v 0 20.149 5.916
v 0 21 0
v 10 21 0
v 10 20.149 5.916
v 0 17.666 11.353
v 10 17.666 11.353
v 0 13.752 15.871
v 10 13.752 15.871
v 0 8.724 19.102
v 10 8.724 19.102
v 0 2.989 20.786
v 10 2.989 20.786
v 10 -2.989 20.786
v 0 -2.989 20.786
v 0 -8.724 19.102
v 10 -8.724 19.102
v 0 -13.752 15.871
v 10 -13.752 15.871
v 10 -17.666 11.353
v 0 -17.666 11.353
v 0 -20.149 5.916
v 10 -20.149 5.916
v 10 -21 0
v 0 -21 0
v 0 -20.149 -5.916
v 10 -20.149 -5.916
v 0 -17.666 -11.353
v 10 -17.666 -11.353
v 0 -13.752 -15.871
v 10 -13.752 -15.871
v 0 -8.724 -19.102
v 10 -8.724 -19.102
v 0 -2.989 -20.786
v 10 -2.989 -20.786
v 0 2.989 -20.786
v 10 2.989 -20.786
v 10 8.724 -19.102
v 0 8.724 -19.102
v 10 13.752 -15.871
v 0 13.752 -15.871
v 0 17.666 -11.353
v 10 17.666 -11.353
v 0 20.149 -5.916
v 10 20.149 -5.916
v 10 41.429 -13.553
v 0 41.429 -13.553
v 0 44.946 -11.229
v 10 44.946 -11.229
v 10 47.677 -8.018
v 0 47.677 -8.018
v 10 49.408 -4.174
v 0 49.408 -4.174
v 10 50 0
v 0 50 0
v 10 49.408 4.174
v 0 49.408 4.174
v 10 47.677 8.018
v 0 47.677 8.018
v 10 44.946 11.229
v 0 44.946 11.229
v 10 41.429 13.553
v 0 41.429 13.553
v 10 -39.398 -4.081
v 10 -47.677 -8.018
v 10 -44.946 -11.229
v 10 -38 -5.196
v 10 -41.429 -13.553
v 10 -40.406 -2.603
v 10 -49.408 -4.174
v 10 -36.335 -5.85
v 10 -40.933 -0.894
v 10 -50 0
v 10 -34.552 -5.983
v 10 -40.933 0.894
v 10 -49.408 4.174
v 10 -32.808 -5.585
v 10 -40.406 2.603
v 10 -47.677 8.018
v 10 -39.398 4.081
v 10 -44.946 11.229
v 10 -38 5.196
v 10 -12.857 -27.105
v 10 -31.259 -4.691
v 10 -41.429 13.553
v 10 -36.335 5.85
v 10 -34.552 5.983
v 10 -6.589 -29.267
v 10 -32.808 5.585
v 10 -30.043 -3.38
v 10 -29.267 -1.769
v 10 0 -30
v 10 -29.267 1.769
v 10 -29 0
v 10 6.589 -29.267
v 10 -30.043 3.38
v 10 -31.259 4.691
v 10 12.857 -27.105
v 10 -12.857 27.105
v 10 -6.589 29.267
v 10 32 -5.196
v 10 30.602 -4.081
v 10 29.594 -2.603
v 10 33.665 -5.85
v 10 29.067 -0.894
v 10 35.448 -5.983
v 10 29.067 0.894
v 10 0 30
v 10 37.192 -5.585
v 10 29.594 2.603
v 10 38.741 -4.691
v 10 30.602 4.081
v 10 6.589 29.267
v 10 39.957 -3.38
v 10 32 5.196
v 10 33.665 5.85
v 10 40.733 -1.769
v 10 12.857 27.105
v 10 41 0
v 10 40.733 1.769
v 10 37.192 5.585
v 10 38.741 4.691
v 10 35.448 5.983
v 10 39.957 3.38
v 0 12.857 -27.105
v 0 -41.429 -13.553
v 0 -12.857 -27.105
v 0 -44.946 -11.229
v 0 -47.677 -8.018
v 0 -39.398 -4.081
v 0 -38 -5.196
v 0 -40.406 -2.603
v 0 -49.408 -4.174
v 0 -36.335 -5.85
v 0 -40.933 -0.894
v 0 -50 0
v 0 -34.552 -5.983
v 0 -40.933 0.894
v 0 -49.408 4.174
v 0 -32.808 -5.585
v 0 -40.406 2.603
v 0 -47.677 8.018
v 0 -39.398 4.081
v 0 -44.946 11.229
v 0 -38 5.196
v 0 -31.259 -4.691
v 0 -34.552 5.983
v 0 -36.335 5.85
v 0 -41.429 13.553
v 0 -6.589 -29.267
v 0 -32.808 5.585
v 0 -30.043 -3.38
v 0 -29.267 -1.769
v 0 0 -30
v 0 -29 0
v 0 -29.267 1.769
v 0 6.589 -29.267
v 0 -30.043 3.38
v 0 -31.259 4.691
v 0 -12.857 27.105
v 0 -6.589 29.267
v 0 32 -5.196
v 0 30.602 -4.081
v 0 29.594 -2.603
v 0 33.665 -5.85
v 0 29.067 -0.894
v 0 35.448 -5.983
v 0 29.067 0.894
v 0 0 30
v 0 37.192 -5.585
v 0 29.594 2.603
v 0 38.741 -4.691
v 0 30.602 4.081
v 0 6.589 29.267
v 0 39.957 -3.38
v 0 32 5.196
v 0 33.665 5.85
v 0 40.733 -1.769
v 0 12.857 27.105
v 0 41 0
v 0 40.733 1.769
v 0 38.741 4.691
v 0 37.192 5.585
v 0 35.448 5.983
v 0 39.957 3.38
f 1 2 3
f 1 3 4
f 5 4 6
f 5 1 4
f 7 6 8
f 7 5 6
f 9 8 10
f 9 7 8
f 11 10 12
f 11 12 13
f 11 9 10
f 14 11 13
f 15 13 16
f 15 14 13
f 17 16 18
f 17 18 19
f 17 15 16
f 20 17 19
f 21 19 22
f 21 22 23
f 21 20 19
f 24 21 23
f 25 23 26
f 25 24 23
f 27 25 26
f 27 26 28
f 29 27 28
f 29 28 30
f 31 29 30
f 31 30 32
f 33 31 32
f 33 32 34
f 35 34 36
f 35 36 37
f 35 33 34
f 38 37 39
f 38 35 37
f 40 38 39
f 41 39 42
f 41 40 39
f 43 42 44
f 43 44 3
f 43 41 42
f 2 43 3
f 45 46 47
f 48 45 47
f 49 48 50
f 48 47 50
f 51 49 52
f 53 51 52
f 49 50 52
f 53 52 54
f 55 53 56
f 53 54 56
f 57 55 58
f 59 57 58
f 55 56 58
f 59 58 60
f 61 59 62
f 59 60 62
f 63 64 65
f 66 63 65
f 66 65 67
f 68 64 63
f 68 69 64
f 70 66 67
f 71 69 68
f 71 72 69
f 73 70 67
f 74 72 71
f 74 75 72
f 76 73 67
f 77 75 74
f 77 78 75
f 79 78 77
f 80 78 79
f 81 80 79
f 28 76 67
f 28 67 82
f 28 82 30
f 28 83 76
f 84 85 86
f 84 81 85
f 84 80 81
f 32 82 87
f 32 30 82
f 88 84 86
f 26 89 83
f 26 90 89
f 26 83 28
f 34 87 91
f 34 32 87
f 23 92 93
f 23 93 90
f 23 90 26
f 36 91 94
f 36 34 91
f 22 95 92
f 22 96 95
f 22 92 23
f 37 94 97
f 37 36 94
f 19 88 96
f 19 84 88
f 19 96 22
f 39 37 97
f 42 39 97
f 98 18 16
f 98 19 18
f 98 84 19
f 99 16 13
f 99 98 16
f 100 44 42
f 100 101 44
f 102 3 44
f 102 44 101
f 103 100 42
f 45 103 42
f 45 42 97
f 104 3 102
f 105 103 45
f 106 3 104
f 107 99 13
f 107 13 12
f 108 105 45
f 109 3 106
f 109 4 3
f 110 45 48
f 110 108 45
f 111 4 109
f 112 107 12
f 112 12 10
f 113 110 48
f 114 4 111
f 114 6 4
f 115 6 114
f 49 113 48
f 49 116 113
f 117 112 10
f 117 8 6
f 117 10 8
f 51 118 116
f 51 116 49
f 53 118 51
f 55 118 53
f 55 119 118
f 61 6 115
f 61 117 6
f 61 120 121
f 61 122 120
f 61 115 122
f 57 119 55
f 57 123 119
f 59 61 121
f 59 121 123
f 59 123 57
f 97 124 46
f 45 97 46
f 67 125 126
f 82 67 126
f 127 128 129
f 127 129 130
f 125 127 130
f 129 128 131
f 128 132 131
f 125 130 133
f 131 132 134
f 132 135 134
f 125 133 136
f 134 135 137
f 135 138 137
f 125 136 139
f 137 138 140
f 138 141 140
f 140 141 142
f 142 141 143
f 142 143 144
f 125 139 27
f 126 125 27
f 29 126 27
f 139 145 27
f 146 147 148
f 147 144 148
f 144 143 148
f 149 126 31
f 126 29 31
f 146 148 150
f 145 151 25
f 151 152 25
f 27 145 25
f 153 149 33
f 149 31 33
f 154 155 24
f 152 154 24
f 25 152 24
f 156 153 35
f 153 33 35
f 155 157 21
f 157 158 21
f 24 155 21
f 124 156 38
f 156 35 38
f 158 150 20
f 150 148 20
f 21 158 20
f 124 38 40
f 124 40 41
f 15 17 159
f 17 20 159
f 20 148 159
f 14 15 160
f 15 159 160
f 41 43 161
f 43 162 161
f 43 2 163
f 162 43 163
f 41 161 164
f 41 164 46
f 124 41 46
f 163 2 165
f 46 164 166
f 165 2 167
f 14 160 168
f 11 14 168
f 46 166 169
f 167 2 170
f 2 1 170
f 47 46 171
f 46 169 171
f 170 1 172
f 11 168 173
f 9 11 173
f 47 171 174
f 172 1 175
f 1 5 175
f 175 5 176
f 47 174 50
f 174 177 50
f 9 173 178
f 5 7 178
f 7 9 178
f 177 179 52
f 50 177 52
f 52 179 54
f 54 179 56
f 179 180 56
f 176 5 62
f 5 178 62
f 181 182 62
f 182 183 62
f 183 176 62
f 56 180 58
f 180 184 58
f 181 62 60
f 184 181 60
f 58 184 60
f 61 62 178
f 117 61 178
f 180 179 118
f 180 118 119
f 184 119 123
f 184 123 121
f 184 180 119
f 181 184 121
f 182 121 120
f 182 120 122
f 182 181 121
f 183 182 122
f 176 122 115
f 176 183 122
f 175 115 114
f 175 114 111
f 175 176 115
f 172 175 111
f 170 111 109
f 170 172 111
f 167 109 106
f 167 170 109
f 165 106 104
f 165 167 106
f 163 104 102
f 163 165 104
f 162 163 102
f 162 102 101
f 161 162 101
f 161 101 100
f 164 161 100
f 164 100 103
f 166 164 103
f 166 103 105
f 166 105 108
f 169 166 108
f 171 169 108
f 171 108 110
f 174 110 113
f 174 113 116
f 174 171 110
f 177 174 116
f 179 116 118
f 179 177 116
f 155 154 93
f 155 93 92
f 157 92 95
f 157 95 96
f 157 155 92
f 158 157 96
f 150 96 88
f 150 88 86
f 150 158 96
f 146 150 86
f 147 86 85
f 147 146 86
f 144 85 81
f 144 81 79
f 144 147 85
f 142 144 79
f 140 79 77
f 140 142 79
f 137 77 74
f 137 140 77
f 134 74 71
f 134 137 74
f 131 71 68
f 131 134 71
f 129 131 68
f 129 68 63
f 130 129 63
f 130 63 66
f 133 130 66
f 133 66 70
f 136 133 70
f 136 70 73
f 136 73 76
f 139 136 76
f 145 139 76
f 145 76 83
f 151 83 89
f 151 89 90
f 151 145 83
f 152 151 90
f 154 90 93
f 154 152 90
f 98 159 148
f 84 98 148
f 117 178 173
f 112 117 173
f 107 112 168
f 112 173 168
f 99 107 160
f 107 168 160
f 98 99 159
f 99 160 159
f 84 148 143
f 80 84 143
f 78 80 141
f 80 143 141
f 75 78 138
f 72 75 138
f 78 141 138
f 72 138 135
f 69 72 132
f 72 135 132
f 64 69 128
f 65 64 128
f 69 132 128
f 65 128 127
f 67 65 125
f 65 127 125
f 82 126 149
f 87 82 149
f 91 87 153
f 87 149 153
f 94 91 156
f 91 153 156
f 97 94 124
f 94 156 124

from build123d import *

# Parameters (mm, degrees)
F0_R     = 6
F0_R_2   = 21
F1_DEPTH = 10


with BuildPart() as f1:
    # F0 (on Right) → F1 (new body)
    with BuildSketch(Plane.YZ):
        with BuildLine():
            Line((-41.428571, -13.552619), (-12.857143, -27.105237))
            ThreePointArc((-12.857143, -27.105237), (0, -30), (12.857143, -27.105237))
            Line((12.857143, -27.105237), (41.428571, -13.552619))
            ThreePointArc((41.428571, -13.552619), (50, 0), (41.428571, 13.552619))
            Line((41.428571, 13.552619), (12.857143, 27.105237))
            ThreePointArc((12.857143, 27.105237), (0, 30), (-12.857143, 27.105237))
            Line((-12.857143, 27.105237), (-41.428571, 13.552619))
            ThreePointArc((-41.428571, 13.552619), (-50, 0), (-41.428571, -13.552619))
        make_face()
        with Locations((-35, 0)):
            Circle(F0_R, mode=Mode.SUBTRACT)
        Circle(F0_R_2, mode=Mode.SUBTRACT)
        with Locations((35, 0)):
            Circle(F0_R, mode=Mode.SUBTRACT)
    extrude(amount=F1_DEPTH)


solid = f1.part
